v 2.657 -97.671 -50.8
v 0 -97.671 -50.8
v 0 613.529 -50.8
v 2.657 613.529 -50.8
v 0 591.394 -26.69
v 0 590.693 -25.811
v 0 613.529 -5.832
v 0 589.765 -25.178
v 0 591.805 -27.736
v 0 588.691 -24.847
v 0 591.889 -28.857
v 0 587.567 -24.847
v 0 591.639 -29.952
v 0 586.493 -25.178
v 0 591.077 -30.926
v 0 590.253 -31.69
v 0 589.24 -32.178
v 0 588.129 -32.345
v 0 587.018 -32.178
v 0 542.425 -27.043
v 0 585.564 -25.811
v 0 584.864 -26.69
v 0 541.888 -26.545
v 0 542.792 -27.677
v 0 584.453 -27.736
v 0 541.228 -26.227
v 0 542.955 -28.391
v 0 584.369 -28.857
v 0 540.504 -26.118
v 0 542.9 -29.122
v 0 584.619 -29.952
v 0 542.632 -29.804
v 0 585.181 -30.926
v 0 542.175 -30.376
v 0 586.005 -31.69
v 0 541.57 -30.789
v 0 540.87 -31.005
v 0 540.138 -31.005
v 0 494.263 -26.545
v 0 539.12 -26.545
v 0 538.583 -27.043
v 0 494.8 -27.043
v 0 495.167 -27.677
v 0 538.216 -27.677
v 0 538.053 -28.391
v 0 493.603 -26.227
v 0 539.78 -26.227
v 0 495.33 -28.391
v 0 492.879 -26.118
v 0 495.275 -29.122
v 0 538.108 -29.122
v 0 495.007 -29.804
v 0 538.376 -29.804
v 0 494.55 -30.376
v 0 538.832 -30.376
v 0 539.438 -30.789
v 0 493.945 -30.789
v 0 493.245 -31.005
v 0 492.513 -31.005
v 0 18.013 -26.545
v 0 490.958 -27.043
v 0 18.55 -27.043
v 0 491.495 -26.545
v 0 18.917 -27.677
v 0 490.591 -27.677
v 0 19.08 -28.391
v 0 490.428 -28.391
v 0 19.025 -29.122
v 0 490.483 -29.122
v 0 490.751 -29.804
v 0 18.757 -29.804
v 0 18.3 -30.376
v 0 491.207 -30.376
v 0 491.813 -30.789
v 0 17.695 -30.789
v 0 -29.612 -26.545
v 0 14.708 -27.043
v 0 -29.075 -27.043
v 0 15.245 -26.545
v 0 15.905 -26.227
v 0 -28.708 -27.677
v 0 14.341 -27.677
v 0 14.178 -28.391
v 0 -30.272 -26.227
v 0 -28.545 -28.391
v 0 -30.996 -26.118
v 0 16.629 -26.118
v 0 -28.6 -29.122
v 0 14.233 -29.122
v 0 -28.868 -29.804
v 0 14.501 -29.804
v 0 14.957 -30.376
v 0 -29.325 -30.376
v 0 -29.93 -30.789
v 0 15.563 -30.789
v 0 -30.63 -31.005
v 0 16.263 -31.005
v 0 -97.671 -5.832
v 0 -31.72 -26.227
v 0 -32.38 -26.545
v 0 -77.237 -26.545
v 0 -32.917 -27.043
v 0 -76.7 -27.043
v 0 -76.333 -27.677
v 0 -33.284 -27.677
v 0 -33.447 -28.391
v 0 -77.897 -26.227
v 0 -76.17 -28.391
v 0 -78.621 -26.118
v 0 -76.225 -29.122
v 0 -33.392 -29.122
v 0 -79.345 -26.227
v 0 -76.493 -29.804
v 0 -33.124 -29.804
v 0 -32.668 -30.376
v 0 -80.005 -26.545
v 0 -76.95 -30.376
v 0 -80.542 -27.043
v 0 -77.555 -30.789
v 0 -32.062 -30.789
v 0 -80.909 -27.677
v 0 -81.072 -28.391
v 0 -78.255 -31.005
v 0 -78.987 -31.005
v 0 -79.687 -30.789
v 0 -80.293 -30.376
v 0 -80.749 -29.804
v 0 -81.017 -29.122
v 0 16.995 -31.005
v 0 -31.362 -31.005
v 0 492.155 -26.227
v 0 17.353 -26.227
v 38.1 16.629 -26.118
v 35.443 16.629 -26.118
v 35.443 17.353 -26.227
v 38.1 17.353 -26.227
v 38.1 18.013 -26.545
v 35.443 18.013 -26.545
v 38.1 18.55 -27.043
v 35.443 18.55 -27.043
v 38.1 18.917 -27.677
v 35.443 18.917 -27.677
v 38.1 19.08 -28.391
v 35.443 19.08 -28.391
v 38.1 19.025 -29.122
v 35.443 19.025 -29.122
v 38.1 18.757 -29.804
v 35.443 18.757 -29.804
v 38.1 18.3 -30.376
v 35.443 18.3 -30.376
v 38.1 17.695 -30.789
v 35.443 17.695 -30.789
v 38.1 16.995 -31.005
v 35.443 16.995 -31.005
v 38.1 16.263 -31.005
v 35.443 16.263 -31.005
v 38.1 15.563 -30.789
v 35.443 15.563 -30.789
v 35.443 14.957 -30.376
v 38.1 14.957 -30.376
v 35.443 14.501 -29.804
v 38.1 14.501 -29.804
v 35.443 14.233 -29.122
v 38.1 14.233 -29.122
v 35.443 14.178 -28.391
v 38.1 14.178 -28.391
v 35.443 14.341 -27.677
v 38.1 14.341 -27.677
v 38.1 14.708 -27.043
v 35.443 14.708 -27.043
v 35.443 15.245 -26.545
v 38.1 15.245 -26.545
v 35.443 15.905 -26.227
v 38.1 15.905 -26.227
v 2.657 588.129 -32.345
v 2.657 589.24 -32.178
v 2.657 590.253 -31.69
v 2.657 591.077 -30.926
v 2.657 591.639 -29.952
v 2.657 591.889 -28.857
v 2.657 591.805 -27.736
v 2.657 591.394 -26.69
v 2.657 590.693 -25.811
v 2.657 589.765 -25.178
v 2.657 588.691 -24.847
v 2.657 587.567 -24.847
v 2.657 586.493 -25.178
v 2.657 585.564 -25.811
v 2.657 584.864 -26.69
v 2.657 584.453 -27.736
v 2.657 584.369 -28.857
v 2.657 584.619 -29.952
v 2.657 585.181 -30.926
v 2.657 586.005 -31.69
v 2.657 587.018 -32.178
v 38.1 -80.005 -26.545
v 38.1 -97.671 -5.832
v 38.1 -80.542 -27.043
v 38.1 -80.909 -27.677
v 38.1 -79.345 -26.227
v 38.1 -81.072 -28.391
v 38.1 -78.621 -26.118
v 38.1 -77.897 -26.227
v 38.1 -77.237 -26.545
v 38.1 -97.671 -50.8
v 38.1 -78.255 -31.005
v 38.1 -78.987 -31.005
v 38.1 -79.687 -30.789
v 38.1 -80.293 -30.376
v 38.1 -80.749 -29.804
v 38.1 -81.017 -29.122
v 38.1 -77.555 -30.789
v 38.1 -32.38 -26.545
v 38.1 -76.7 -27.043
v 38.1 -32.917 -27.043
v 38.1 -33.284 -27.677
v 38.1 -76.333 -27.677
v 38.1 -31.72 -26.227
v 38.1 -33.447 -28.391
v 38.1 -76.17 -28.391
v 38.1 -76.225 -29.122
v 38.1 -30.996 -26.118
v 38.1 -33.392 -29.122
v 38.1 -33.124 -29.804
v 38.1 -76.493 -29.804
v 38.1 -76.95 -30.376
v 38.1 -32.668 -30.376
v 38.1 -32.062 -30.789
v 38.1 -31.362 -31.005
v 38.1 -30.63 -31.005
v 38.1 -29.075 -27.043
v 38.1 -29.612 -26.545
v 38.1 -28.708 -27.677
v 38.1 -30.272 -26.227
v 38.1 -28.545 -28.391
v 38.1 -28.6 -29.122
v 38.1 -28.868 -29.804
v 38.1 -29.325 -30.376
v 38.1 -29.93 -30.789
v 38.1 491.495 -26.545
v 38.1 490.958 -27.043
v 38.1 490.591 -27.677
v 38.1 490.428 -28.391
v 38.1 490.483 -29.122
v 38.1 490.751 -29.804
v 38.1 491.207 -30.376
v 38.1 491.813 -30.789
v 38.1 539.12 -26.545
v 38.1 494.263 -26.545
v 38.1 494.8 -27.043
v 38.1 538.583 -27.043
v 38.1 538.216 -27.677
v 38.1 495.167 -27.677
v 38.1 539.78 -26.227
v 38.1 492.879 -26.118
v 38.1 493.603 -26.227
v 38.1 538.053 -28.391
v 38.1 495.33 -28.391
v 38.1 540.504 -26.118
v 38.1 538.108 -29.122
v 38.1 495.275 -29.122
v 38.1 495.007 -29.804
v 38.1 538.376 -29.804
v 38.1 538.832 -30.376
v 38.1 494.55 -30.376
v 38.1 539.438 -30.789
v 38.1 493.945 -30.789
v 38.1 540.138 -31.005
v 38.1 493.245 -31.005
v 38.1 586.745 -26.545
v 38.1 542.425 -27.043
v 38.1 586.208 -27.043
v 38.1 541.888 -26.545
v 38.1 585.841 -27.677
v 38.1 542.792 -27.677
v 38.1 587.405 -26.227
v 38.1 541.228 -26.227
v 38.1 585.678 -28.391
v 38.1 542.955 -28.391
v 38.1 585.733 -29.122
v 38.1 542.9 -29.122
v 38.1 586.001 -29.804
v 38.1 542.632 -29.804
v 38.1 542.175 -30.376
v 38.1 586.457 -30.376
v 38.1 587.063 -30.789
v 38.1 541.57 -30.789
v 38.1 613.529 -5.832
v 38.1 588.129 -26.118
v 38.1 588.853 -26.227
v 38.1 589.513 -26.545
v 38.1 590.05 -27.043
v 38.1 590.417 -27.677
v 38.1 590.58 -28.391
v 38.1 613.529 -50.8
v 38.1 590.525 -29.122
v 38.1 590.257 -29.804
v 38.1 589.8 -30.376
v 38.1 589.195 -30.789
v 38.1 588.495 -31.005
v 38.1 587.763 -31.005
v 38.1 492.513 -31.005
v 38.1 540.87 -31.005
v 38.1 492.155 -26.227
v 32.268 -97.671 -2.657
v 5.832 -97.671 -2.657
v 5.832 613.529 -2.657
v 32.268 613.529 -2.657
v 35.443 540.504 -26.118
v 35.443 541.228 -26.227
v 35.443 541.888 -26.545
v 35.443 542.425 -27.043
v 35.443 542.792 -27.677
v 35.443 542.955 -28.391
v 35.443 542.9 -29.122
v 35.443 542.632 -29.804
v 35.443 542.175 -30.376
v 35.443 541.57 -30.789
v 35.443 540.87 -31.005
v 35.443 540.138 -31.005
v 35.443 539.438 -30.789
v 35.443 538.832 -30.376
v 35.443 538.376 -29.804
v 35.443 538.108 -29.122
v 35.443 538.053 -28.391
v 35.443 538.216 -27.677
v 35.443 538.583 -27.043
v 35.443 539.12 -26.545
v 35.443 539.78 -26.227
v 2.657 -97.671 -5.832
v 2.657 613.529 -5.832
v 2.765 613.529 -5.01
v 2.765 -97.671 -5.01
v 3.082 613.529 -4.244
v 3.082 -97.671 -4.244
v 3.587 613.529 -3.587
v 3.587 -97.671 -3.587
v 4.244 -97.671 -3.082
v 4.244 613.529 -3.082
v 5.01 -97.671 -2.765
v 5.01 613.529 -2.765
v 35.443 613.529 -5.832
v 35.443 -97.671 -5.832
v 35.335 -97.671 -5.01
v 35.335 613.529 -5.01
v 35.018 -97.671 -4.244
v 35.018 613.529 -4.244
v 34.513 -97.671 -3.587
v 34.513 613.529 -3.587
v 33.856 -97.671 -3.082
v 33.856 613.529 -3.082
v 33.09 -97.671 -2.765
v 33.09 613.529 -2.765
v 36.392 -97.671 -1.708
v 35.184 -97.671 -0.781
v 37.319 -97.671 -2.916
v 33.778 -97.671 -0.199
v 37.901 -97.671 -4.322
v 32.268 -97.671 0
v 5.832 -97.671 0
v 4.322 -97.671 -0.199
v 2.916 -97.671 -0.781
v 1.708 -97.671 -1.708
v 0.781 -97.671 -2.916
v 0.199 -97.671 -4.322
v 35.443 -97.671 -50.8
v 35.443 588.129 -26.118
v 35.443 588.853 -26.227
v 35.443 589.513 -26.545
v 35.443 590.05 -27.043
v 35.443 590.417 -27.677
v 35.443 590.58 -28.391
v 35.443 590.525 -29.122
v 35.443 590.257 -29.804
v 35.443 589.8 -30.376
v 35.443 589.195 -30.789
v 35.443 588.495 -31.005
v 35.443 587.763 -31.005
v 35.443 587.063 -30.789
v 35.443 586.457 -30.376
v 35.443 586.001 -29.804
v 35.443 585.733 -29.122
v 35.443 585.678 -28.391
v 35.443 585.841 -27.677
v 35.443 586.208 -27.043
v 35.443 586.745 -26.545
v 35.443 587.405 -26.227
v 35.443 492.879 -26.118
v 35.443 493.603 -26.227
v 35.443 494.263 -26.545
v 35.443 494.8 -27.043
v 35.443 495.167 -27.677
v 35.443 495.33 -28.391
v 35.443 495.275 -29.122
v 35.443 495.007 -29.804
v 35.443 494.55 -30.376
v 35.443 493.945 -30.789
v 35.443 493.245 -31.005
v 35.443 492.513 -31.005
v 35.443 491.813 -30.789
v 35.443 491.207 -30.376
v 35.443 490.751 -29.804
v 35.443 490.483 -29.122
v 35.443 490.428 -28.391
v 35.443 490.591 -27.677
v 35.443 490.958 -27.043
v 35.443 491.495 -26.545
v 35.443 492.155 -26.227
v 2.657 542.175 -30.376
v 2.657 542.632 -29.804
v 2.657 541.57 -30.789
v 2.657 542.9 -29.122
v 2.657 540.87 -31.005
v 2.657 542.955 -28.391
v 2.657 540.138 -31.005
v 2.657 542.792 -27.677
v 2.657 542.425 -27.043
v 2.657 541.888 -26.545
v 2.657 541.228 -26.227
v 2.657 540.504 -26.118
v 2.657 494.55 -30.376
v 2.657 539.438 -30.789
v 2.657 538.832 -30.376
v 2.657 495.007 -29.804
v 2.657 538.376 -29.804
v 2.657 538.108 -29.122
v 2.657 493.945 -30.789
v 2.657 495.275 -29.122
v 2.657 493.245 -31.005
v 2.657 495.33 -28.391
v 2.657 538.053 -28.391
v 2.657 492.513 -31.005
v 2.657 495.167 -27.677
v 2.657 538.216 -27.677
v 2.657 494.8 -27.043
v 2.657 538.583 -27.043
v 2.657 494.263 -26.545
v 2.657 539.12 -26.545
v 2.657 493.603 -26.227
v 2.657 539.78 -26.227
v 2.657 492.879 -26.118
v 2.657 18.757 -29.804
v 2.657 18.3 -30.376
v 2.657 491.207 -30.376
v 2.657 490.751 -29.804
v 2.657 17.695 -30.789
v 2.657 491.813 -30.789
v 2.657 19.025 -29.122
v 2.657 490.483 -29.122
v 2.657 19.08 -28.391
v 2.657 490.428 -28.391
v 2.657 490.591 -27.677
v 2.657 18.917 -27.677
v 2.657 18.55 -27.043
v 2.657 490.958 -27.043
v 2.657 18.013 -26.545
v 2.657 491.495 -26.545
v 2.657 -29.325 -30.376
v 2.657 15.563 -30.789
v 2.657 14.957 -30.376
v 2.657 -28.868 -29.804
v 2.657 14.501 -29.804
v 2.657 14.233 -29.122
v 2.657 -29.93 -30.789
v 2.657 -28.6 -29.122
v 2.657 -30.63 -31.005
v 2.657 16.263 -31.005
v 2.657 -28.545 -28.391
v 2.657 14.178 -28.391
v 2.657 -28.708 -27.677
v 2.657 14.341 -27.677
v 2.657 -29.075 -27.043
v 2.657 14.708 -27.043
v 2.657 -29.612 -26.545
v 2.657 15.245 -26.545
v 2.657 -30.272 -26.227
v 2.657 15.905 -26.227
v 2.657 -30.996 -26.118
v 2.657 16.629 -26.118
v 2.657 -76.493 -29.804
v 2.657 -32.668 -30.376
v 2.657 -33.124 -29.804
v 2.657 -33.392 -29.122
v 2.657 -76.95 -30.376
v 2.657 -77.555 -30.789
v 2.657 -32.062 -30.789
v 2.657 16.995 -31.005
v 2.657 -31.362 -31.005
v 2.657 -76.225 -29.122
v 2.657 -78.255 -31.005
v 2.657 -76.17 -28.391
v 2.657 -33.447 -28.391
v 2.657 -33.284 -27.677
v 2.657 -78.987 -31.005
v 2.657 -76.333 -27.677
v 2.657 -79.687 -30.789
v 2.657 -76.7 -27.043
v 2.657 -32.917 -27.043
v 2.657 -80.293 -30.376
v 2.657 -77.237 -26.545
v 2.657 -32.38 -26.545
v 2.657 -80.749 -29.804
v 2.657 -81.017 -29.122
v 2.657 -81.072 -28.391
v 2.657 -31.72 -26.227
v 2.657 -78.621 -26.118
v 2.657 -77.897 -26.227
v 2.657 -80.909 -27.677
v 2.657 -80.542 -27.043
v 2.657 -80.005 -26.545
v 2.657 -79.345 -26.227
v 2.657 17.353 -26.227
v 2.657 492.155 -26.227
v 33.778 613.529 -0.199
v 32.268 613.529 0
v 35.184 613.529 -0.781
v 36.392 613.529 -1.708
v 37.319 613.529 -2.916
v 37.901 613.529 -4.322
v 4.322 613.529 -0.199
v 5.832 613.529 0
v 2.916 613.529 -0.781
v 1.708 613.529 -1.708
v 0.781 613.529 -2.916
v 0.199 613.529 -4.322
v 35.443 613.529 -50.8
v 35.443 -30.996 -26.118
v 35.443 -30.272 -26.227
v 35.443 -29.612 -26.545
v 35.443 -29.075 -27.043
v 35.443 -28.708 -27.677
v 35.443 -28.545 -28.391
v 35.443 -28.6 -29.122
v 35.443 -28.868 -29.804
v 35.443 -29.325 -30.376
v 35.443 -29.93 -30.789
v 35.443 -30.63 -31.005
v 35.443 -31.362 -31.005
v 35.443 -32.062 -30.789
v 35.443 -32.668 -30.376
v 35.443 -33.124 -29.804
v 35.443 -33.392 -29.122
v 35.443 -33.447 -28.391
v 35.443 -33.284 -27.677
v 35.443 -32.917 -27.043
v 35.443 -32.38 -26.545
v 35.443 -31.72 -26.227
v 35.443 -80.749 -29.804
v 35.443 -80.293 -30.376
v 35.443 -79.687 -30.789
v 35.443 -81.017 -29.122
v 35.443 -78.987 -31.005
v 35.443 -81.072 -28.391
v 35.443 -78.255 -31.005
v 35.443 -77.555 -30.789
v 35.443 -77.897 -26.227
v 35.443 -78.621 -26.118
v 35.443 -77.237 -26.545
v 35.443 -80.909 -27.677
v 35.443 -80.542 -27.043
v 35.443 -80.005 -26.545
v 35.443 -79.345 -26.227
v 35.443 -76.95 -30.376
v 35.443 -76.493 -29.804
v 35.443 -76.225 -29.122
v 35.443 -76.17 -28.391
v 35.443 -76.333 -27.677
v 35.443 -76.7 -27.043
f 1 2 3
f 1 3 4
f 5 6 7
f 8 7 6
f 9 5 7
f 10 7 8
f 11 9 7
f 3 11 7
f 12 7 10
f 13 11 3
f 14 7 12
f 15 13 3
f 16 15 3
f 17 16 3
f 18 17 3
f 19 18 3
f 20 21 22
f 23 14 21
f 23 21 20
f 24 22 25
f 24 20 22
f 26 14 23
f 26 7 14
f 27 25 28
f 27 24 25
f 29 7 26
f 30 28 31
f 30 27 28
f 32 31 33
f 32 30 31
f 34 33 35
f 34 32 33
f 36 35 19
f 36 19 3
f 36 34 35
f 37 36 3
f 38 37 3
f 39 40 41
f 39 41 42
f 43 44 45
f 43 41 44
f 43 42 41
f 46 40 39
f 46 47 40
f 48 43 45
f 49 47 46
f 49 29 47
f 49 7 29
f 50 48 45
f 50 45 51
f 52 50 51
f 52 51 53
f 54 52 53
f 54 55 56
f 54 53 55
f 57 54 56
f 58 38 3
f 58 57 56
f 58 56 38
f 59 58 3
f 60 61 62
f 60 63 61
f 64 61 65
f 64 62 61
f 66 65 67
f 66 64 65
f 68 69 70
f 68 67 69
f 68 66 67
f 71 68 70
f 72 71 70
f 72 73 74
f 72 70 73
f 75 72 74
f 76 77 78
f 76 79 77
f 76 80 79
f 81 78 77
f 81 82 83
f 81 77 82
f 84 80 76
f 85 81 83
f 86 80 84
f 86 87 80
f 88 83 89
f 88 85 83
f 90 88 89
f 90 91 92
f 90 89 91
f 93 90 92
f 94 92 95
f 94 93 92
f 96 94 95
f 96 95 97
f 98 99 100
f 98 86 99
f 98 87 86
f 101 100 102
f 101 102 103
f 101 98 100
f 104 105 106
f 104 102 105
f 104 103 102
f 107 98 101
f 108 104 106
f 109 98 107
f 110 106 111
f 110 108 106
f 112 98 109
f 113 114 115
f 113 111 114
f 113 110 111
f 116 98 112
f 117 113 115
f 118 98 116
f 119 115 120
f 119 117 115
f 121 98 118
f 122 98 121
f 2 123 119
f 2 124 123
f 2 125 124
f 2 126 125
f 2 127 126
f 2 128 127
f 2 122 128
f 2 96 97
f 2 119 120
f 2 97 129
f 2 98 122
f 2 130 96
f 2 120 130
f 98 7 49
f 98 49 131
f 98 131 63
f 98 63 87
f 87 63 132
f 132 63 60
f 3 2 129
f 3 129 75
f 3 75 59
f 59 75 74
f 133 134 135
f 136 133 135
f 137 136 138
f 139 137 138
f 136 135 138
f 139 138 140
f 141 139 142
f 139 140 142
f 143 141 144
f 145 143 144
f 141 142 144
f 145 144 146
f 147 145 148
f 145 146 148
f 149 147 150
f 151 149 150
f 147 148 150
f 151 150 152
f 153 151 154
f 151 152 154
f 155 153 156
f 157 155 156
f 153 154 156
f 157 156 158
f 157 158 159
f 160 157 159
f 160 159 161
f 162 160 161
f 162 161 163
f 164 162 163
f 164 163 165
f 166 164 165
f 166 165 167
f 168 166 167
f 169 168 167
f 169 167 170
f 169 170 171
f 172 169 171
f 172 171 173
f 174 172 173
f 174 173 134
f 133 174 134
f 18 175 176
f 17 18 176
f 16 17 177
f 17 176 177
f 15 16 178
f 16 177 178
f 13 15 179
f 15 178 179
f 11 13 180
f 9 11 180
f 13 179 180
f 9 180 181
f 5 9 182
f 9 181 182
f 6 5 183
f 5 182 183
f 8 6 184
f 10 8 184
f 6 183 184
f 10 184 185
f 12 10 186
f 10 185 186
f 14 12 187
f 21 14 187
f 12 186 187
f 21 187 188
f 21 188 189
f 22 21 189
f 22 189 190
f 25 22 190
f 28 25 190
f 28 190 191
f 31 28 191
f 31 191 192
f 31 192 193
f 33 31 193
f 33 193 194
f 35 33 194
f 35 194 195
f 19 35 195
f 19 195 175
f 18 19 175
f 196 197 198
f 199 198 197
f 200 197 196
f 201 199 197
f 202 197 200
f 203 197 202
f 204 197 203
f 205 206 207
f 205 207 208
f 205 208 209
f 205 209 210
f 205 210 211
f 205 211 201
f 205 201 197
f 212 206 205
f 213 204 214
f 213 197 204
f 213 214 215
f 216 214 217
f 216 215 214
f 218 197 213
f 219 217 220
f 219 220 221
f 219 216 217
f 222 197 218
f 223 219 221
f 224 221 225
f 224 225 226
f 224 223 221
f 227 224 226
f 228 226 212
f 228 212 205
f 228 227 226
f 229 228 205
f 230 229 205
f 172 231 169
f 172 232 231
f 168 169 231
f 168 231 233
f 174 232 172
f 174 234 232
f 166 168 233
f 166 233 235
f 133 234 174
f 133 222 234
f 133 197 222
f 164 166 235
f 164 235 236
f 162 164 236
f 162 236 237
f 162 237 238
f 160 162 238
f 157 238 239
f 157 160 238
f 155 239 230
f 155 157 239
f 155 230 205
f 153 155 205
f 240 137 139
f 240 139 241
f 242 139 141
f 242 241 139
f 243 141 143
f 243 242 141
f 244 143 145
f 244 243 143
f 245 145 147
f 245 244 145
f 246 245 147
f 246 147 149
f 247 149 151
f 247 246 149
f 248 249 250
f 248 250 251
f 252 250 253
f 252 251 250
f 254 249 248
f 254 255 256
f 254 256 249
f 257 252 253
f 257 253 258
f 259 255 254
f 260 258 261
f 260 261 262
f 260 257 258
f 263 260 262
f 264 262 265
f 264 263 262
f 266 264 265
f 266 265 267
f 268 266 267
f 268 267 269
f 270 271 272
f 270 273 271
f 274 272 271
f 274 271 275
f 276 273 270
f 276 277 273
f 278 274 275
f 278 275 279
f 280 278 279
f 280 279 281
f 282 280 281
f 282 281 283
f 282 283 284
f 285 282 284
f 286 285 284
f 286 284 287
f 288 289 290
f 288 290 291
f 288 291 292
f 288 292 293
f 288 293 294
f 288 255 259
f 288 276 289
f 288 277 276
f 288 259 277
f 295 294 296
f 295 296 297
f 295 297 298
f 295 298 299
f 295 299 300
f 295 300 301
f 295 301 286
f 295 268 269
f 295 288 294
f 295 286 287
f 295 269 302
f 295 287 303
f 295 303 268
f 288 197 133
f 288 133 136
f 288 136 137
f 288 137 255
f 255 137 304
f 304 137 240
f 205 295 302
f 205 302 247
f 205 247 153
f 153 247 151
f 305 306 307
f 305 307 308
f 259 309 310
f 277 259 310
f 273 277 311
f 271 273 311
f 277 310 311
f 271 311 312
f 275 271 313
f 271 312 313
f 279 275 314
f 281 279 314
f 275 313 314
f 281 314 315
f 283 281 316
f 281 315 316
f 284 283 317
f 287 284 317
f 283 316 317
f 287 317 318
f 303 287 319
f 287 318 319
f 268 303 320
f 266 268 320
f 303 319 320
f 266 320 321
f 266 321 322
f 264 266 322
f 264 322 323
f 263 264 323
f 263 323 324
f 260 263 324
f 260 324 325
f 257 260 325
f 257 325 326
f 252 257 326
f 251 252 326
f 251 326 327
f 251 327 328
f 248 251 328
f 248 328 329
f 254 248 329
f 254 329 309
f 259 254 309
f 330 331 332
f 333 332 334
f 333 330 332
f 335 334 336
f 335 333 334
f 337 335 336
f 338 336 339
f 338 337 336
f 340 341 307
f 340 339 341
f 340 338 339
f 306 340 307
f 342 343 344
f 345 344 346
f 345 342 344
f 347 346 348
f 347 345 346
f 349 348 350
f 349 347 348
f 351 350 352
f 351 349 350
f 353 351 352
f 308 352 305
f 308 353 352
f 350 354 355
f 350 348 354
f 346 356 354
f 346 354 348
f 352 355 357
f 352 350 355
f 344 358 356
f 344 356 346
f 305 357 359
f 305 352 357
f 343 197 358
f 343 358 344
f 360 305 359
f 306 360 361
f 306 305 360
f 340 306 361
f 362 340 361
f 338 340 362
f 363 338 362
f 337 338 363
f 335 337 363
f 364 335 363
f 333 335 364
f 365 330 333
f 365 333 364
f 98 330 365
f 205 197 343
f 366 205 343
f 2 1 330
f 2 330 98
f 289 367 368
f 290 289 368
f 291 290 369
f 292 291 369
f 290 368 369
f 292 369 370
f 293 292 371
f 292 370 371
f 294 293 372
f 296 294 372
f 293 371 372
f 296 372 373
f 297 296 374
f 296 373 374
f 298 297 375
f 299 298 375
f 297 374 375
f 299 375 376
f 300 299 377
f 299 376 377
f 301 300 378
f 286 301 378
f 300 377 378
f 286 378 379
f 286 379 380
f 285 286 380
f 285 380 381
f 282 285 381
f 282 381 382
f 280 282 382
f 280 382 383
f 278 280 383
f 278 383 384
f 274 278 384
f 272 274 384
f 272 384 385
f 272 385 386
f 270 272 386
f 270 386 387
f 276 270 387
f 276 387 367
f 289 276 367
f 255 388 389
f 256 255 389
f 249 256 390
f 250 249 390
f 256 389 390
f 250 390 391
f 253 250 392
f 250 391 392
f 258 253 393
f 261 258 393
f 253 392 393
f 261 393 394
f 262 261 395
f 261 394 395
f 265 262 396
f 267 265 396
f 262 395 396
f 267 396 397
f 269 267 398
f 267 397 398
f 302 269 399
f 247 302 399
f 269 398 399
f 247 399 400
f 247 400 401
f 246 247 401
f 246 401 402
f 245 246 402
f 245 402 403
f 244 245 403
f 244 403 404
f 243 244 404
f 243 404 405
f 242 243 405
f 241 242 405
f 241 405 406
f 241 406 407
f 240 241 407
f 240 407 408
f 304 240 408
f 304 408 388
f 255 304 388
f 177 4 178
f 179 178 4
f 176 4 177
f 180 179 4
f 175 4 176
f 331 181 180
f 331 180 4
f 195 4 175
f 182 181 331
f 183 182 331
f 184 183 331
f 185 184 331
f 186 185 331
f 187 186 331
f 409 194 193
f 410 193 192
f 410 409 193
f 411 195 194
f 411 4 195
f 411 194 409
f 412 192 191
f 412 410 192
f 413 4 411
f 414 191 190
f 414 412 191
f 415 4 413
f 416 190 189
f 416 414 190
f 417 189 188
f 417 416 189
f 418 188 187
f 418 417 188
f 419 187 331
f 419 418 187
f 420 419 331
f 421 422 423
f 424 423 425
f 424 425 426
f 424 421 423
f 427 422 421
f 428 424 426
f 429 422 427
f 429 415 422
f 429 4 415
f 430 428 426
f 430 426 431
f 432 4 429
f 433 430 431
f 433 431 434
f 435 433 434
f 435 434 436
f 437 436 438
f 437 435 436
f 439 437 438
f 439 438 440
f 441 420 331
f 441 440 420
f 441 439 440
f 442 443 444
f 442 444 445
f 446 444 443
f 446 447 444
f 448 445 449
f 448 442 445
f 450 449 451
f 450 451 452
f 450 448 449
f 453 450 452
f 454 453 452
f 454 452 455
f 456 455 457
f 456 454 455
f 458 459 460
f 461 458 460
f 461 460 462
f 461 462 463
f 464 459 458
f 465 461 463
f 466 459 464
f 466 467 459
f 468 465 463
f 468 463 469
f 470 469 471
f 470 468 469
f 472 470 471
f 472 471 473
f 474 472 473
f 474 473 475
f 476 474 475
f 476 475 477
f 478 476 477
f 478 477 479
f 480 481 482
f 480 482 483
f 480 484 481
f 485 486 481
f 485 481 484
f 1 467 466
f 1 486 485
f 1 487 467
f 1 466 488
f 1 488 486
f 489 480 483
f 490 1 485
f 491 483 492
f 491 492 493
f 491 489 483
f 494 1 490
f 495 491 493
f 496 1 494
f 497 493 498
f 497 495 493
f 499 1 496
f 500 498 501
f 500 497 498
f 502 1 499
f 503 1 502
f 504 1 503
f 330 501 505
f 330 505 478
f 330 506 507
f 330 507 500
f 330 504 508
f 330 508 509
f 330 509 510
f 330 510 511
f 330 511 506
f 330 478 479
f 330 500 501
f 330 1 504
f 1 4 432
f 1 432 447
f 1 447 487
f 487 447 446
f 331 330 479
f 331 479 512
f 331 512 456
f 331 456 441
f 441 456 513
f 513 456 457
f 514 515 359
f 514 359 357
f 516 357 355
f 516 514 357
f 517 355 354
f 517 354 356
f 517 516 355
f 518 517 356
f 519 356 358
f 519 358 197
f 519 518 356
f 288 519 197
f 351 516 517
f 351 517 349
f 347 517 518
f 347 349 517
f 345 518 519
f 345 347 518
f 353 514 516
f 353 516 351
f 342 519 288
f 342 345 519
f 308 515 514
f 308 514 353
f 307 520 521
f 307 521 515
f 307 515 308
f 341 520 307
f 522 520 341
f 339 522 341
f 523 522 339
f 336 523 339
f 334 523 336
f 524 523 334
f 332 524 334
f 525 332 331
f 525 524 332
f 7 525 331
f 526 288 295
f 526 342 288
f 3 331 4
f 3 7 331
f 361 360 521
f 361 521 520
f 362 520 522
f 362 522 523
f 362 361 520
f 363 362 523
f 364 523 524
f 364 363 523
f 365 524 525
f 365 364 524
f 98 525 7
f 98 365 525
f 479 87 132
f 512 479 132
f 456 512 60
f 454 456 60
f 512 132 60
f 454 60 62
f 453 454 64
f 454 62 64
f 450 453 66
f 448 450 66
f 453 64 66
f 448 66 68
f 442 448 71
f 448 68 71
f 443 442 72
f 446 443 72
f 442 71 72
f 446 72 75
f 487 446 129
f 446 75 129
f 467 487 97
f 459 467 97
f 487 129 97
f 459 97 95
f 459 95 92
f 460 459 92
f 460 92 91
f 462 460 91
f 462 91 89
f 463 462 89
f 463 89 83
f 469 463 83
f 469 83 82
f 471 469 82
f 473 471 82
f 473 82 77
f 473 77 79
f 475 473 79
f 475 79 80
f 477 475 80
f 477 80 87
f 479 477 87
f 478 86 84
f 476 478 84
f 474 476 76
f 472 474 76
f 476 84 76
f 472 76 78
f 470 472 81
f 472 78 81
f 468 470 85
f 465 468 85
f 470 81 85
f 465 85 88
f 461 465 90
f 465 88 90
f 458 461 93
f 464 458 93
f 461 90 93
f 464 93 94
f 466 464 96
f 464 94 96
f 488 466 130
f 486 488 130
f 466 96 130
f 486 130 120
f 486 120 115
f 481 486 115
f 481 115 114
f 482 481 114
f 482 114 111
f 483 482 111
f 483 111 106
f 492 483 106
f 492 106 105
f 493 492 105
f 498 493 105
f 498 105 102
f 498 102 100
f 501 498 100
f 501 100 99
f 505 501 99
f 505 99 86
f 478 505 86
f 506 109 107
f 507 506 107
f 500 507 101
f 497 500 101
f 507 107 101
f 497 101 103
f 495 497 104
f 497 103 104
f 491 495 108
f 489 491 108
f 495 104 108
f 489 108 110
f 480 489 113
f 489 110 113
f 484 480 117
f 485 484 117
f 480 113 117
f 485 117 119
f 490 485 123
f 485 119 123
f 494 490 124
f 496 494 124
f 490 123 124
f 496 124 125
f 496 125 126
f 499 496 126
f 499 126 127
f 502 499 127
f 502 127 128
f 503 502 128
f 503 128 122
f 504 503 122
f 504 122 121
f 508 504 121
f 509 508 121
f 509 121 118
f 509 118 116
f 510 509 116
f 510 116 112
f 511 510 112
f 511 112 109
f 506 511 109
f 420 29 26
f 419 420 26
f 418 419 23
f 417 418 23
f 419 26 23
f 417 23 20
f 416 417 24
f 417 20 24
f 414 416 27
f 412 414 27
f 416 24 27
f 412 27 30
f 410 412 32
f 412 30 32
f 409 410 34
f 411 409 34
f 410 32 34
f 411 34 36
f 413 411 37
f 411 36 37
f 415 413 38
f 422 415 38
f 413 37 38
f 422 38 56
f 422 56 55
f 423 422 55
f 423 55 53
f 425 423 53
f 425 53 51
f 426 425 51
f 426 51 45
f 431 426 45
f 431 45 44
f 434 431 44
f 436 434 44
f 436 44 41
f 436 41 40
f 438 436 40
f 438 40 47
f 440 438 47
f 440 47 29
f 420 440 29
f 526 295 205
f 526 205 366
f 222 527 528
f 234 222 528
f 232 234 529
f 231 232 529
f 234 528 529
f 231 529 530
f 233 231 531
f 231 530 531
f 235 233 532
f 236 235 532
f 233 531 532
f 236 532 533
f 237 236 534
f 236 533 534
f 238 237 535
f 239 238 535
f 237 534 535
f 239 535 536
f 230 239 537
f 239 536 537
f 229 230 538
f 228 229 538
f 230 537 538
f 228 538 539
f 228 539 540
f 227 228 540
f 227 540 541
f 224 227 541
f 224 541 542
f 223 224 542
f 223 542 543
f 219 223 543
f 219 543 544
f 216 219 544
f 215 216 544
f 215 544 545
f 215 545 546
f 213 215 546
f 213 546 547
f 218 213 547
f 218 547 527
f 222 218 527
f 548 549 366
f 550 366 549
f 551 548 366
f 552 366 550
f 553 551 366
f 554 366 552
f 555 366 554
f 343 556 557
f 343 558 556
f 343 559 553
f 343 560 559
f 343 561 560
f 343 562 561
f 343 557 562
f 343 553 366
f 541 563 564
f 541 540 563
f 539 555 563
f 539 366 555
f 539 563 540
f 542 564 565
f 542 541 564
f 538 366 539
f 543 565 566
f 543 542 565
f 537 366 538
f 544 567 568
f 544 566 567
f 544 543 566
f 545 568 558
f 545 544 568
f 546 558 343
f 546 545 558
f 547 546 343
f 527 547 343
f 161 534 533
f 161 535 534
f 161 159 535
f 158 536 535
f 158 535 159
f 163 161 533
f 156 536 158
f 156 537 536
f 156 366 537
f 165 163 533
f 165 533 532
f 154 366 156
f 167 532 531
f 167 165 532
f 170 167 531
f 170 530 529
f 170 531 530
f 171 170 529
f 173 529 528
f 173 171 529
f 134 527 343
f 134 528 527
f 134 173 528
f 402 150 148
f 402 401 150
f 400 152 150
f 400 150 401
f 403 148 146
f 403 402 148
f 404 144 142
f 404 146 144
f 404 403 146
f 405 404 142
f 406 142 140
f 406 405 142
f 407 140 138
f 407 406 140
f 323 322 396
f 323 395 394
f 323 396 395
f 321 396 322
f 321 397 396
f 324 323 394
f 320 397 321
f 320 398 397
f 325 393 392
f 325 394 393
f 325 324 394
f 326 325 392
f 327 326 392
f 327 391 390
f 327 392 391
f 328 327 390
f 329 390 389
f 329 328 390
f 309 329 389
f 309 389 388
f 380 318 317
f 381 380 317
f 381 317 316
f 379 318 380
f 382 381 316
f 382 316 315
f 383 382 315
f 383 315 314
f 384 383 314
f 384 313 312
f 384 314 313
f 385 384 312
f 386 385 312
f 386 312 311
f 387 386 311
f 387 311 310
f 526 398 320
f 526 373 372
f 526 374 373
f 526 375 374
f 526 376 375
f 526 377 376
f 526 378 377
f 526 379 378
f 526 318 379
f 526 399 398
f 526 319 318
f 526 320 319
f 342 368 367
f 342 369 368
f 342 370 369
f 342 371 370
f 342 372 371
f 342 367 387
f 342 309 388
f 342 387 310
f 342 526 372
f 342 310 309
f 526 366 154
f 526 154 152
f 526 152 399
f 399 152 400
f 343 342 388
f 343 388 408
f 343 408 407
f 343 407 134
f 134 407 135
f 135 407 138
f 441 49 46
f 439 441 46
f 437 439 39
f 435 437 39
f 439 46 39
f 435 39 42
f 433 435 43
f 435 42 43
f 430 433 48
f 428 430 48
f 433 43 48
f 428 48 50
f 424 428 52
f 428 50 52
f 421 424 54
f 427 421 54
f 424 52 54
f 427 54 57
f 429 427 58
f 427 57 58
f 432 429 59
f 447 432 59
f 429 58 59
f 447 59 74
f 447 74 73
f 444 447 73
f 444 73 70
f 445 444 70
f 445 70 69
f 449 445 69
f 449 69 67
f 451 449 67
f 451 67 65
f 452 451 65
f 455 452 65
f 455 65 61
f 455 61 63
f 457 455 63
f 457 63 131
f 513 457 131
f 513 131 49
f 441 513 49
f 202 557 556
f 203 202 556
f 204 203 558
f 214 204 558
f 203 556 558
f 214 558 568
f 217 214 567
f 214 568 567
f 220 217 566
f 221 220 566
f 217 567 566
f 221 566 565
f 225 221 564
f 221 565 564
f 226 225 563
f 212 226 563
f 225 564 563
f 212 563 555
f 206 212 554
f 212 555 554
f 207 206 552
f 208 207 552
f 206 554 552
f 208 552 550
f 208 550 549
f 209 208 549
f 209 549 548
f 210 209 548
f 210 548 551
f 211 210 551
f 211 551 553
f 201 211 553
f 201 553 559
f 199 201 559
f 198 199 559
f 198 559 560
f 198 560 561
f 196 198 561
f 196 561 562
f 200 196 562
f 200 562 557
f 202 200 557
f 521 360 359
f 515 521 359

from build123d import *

# Parameters (mm, degrees)
SKETCH1_W                            = 38.1
SKETCH1_H                            = 749.3
BASE_FLANGE1_DEPTH                   = 2.65684
EDGE_FLANGE1_STRIP_W                 = 16.97736
EDGE_FLANGE1_STRIP_H                 = 2.65684
EDGE_FLANGE1_STRIP_CUT_DEPTH         = 749.3
EDGE_FLANGE1_STRIP_2_W               = 16.97736
EDGE_FLANGE1_STRIP_2_H               = 2.65684
EDGE_FLANGE1_STRIP_CUT_2_DEPTH       = 749.3
EDGE_FLANGE1_DEPTH                   = 749.3
EDGE_FLANGE1_BEND_DEPTH              = 749.3
CUT_EXTRUDE1_START                   = -38.1
CUT_EXTRUDE1_OUTLINE_W               = 50.8
CUT_EXTRUDE1_OUTLINE_H               = 38.1
CUT_EXTRUDE1_DEPTH                   = 38.1
F_10_0_1935_DIAMETER_HOLE1_D         = 4.9149
F_19_64_0_29688_DIAMETER_HOLE3_D     = 7.540752
F_19_64_0_29688_DIAMETER_HOLE3_DEPTH = 35.44216


# Read off the part's stored shape, not the designer's step: Cut-Extrude1
# Sheet-metal steps are written as plain solids
with BuildPart() as part:
    # Sketch1 → Base-Flange1 (new body)
    with BuildSketch(Plane.XY):
        with Locations((19.05, 276.978929766)):
            Rectangle(SKETCH1_W, SKETCH1_H)
    extrude(amount=-BASE_FLANGE1_DEPTH)

    # Edge-Flange1 strip (across the edge) → Edge-Flange1 strip cut (cut)
    with BuildSketch(Plane(origin=(38.1, 651.628929766, -2.65684), x_dir=(-1, 0, 0), z_dir=(0, -1, 0))):
        with Locations((-2.65684, -1.32842)):
            Rectangle(EDGE_FLANGE1_STRIP_W, EDGE_FLANGE1_STRIP_H)
    extrude(amount=EDGE_FLANGE1_STRIP_CUT_DEPTH, mode=Mode.SUBTRACT)

    # Edge-Flange1 strip 2 (across the edge) → Edge-Flange1 strip cut 2 (cut)
    with BuildSketch(Plane(origin=(0, -97.671070234, -2.65684), x_dir=(1, 0, 0), z_dir=(0, 1, 0))):
        with Locations((-2.65684, -1.32842)):
            Rectangle(EDGE_FLANGE1_STRIP_2_W, EDGE_FLANGE1_STRIP_2_H)
    extrude(amount=EDGE_FLANGE1_STRIP_CUT_2_DEPTH, mode=Mode.SUBTRACT)

    # Edge-Flange1 section (across the edge) → Edge-Flange1 (add)
    with BuildSketch(Plane(origin=(38.1, 651.628929766, -2.65684), x_dir=(-1, 0, 0), z_dir=(0, -1, 0))):
        with BuildLine():
            Line((0, 3.175), (0, 48.14316))
            Line((0, 48.14316), (2.65684, 48.14316))
            Line((2.65684, 48.14316), (2.65684, 3.175))
            ThreePointArc((2.65684, 3.175), (3.58677597, 0.92993597), (5.83184, 0))
            Line((5.83184, 0), (5.83184, -2.65684))
            ThreePointArc((5.83184, -2.65684), (1.708106389, -0.948733611), (0, 3.175))
        make_face()
    extrude(amount=EDGE_FLANGE1_DEPTH)

    # Edge-Flange1 section 2 (across the edge) → Edge-Flange1 bend (add)
    with BuildSketch(Plane(origin=(0, -97.671070234, -2.65684), x_dir=(1, 0, 0), z_dir=(0, 1, 0))):
        with BuildLine():
            Line((0, 3.175), (0, 48.14316))
            Line((0, 48.14316), (2.65684, 48.14316))
            Line((2.65684, 48.14316), (2.65684, 3.175))
            ThreePointArc((2.65684, 3.175), (3.58677597, 0.92993597), (5.83184, 0))
            Line((5.83184, 0), (5.83184, -2.65684))
            ThreePointArc((5.83184, -2.65684), (1.708106389, -0.948733611), (0, 3.175))
        make_face()
    extrude(amount=EDGE_FLANGE1_BEND_DEPTH)

    # Cut-Extrude1 outline → Cut-Extrude1 (cut)
    with BuildSketch(Plane(origin=(38.1, 0, 0), x_dir=(0, 0, -1), z_dir=(1, 0, 0)).offset(CUT_EXTRUDE1_START)):
        with Locations((25.4, 632.578929766)):
            Rectangle(CUT_EXTRUDE1_OUTLINE_W, CUT_EXTRUDE1_OUTLINE_H)
    extrude(amount=CUT_EXTRUDE1_DEPTH, mode=Mode.SUBTRACT)

    # #10 (0.1935) Diameter Hole1 (through all)
    with Locations(Plane(origin=(38.1, 0, 0), x_dir=(0, 0, -1), z_dir=(1, 0, 0))):
        with Locations((28.575, -78.621070234), (28.575, -30.996070234), (28.575, 16.628929766), (28.575, 588.128929766), (28.575, 540.503929766), (28.575, 492.878929766)):
            Hole(F_10_0_1935_DIAMETER_HOLE1_D / 2)

    # 19/64 (0.29688) Diameter Hole3
    with Locations(Plane.ZY):
        with Locations((-28.575, 588.128929766)):
            Hole(F_19_64_0_29688_DIAMETER_HOLE3_D / 2, depth=F_19_64_0_29688_DIAMETER_HOLE3_DEPTH)


solid = part.part
